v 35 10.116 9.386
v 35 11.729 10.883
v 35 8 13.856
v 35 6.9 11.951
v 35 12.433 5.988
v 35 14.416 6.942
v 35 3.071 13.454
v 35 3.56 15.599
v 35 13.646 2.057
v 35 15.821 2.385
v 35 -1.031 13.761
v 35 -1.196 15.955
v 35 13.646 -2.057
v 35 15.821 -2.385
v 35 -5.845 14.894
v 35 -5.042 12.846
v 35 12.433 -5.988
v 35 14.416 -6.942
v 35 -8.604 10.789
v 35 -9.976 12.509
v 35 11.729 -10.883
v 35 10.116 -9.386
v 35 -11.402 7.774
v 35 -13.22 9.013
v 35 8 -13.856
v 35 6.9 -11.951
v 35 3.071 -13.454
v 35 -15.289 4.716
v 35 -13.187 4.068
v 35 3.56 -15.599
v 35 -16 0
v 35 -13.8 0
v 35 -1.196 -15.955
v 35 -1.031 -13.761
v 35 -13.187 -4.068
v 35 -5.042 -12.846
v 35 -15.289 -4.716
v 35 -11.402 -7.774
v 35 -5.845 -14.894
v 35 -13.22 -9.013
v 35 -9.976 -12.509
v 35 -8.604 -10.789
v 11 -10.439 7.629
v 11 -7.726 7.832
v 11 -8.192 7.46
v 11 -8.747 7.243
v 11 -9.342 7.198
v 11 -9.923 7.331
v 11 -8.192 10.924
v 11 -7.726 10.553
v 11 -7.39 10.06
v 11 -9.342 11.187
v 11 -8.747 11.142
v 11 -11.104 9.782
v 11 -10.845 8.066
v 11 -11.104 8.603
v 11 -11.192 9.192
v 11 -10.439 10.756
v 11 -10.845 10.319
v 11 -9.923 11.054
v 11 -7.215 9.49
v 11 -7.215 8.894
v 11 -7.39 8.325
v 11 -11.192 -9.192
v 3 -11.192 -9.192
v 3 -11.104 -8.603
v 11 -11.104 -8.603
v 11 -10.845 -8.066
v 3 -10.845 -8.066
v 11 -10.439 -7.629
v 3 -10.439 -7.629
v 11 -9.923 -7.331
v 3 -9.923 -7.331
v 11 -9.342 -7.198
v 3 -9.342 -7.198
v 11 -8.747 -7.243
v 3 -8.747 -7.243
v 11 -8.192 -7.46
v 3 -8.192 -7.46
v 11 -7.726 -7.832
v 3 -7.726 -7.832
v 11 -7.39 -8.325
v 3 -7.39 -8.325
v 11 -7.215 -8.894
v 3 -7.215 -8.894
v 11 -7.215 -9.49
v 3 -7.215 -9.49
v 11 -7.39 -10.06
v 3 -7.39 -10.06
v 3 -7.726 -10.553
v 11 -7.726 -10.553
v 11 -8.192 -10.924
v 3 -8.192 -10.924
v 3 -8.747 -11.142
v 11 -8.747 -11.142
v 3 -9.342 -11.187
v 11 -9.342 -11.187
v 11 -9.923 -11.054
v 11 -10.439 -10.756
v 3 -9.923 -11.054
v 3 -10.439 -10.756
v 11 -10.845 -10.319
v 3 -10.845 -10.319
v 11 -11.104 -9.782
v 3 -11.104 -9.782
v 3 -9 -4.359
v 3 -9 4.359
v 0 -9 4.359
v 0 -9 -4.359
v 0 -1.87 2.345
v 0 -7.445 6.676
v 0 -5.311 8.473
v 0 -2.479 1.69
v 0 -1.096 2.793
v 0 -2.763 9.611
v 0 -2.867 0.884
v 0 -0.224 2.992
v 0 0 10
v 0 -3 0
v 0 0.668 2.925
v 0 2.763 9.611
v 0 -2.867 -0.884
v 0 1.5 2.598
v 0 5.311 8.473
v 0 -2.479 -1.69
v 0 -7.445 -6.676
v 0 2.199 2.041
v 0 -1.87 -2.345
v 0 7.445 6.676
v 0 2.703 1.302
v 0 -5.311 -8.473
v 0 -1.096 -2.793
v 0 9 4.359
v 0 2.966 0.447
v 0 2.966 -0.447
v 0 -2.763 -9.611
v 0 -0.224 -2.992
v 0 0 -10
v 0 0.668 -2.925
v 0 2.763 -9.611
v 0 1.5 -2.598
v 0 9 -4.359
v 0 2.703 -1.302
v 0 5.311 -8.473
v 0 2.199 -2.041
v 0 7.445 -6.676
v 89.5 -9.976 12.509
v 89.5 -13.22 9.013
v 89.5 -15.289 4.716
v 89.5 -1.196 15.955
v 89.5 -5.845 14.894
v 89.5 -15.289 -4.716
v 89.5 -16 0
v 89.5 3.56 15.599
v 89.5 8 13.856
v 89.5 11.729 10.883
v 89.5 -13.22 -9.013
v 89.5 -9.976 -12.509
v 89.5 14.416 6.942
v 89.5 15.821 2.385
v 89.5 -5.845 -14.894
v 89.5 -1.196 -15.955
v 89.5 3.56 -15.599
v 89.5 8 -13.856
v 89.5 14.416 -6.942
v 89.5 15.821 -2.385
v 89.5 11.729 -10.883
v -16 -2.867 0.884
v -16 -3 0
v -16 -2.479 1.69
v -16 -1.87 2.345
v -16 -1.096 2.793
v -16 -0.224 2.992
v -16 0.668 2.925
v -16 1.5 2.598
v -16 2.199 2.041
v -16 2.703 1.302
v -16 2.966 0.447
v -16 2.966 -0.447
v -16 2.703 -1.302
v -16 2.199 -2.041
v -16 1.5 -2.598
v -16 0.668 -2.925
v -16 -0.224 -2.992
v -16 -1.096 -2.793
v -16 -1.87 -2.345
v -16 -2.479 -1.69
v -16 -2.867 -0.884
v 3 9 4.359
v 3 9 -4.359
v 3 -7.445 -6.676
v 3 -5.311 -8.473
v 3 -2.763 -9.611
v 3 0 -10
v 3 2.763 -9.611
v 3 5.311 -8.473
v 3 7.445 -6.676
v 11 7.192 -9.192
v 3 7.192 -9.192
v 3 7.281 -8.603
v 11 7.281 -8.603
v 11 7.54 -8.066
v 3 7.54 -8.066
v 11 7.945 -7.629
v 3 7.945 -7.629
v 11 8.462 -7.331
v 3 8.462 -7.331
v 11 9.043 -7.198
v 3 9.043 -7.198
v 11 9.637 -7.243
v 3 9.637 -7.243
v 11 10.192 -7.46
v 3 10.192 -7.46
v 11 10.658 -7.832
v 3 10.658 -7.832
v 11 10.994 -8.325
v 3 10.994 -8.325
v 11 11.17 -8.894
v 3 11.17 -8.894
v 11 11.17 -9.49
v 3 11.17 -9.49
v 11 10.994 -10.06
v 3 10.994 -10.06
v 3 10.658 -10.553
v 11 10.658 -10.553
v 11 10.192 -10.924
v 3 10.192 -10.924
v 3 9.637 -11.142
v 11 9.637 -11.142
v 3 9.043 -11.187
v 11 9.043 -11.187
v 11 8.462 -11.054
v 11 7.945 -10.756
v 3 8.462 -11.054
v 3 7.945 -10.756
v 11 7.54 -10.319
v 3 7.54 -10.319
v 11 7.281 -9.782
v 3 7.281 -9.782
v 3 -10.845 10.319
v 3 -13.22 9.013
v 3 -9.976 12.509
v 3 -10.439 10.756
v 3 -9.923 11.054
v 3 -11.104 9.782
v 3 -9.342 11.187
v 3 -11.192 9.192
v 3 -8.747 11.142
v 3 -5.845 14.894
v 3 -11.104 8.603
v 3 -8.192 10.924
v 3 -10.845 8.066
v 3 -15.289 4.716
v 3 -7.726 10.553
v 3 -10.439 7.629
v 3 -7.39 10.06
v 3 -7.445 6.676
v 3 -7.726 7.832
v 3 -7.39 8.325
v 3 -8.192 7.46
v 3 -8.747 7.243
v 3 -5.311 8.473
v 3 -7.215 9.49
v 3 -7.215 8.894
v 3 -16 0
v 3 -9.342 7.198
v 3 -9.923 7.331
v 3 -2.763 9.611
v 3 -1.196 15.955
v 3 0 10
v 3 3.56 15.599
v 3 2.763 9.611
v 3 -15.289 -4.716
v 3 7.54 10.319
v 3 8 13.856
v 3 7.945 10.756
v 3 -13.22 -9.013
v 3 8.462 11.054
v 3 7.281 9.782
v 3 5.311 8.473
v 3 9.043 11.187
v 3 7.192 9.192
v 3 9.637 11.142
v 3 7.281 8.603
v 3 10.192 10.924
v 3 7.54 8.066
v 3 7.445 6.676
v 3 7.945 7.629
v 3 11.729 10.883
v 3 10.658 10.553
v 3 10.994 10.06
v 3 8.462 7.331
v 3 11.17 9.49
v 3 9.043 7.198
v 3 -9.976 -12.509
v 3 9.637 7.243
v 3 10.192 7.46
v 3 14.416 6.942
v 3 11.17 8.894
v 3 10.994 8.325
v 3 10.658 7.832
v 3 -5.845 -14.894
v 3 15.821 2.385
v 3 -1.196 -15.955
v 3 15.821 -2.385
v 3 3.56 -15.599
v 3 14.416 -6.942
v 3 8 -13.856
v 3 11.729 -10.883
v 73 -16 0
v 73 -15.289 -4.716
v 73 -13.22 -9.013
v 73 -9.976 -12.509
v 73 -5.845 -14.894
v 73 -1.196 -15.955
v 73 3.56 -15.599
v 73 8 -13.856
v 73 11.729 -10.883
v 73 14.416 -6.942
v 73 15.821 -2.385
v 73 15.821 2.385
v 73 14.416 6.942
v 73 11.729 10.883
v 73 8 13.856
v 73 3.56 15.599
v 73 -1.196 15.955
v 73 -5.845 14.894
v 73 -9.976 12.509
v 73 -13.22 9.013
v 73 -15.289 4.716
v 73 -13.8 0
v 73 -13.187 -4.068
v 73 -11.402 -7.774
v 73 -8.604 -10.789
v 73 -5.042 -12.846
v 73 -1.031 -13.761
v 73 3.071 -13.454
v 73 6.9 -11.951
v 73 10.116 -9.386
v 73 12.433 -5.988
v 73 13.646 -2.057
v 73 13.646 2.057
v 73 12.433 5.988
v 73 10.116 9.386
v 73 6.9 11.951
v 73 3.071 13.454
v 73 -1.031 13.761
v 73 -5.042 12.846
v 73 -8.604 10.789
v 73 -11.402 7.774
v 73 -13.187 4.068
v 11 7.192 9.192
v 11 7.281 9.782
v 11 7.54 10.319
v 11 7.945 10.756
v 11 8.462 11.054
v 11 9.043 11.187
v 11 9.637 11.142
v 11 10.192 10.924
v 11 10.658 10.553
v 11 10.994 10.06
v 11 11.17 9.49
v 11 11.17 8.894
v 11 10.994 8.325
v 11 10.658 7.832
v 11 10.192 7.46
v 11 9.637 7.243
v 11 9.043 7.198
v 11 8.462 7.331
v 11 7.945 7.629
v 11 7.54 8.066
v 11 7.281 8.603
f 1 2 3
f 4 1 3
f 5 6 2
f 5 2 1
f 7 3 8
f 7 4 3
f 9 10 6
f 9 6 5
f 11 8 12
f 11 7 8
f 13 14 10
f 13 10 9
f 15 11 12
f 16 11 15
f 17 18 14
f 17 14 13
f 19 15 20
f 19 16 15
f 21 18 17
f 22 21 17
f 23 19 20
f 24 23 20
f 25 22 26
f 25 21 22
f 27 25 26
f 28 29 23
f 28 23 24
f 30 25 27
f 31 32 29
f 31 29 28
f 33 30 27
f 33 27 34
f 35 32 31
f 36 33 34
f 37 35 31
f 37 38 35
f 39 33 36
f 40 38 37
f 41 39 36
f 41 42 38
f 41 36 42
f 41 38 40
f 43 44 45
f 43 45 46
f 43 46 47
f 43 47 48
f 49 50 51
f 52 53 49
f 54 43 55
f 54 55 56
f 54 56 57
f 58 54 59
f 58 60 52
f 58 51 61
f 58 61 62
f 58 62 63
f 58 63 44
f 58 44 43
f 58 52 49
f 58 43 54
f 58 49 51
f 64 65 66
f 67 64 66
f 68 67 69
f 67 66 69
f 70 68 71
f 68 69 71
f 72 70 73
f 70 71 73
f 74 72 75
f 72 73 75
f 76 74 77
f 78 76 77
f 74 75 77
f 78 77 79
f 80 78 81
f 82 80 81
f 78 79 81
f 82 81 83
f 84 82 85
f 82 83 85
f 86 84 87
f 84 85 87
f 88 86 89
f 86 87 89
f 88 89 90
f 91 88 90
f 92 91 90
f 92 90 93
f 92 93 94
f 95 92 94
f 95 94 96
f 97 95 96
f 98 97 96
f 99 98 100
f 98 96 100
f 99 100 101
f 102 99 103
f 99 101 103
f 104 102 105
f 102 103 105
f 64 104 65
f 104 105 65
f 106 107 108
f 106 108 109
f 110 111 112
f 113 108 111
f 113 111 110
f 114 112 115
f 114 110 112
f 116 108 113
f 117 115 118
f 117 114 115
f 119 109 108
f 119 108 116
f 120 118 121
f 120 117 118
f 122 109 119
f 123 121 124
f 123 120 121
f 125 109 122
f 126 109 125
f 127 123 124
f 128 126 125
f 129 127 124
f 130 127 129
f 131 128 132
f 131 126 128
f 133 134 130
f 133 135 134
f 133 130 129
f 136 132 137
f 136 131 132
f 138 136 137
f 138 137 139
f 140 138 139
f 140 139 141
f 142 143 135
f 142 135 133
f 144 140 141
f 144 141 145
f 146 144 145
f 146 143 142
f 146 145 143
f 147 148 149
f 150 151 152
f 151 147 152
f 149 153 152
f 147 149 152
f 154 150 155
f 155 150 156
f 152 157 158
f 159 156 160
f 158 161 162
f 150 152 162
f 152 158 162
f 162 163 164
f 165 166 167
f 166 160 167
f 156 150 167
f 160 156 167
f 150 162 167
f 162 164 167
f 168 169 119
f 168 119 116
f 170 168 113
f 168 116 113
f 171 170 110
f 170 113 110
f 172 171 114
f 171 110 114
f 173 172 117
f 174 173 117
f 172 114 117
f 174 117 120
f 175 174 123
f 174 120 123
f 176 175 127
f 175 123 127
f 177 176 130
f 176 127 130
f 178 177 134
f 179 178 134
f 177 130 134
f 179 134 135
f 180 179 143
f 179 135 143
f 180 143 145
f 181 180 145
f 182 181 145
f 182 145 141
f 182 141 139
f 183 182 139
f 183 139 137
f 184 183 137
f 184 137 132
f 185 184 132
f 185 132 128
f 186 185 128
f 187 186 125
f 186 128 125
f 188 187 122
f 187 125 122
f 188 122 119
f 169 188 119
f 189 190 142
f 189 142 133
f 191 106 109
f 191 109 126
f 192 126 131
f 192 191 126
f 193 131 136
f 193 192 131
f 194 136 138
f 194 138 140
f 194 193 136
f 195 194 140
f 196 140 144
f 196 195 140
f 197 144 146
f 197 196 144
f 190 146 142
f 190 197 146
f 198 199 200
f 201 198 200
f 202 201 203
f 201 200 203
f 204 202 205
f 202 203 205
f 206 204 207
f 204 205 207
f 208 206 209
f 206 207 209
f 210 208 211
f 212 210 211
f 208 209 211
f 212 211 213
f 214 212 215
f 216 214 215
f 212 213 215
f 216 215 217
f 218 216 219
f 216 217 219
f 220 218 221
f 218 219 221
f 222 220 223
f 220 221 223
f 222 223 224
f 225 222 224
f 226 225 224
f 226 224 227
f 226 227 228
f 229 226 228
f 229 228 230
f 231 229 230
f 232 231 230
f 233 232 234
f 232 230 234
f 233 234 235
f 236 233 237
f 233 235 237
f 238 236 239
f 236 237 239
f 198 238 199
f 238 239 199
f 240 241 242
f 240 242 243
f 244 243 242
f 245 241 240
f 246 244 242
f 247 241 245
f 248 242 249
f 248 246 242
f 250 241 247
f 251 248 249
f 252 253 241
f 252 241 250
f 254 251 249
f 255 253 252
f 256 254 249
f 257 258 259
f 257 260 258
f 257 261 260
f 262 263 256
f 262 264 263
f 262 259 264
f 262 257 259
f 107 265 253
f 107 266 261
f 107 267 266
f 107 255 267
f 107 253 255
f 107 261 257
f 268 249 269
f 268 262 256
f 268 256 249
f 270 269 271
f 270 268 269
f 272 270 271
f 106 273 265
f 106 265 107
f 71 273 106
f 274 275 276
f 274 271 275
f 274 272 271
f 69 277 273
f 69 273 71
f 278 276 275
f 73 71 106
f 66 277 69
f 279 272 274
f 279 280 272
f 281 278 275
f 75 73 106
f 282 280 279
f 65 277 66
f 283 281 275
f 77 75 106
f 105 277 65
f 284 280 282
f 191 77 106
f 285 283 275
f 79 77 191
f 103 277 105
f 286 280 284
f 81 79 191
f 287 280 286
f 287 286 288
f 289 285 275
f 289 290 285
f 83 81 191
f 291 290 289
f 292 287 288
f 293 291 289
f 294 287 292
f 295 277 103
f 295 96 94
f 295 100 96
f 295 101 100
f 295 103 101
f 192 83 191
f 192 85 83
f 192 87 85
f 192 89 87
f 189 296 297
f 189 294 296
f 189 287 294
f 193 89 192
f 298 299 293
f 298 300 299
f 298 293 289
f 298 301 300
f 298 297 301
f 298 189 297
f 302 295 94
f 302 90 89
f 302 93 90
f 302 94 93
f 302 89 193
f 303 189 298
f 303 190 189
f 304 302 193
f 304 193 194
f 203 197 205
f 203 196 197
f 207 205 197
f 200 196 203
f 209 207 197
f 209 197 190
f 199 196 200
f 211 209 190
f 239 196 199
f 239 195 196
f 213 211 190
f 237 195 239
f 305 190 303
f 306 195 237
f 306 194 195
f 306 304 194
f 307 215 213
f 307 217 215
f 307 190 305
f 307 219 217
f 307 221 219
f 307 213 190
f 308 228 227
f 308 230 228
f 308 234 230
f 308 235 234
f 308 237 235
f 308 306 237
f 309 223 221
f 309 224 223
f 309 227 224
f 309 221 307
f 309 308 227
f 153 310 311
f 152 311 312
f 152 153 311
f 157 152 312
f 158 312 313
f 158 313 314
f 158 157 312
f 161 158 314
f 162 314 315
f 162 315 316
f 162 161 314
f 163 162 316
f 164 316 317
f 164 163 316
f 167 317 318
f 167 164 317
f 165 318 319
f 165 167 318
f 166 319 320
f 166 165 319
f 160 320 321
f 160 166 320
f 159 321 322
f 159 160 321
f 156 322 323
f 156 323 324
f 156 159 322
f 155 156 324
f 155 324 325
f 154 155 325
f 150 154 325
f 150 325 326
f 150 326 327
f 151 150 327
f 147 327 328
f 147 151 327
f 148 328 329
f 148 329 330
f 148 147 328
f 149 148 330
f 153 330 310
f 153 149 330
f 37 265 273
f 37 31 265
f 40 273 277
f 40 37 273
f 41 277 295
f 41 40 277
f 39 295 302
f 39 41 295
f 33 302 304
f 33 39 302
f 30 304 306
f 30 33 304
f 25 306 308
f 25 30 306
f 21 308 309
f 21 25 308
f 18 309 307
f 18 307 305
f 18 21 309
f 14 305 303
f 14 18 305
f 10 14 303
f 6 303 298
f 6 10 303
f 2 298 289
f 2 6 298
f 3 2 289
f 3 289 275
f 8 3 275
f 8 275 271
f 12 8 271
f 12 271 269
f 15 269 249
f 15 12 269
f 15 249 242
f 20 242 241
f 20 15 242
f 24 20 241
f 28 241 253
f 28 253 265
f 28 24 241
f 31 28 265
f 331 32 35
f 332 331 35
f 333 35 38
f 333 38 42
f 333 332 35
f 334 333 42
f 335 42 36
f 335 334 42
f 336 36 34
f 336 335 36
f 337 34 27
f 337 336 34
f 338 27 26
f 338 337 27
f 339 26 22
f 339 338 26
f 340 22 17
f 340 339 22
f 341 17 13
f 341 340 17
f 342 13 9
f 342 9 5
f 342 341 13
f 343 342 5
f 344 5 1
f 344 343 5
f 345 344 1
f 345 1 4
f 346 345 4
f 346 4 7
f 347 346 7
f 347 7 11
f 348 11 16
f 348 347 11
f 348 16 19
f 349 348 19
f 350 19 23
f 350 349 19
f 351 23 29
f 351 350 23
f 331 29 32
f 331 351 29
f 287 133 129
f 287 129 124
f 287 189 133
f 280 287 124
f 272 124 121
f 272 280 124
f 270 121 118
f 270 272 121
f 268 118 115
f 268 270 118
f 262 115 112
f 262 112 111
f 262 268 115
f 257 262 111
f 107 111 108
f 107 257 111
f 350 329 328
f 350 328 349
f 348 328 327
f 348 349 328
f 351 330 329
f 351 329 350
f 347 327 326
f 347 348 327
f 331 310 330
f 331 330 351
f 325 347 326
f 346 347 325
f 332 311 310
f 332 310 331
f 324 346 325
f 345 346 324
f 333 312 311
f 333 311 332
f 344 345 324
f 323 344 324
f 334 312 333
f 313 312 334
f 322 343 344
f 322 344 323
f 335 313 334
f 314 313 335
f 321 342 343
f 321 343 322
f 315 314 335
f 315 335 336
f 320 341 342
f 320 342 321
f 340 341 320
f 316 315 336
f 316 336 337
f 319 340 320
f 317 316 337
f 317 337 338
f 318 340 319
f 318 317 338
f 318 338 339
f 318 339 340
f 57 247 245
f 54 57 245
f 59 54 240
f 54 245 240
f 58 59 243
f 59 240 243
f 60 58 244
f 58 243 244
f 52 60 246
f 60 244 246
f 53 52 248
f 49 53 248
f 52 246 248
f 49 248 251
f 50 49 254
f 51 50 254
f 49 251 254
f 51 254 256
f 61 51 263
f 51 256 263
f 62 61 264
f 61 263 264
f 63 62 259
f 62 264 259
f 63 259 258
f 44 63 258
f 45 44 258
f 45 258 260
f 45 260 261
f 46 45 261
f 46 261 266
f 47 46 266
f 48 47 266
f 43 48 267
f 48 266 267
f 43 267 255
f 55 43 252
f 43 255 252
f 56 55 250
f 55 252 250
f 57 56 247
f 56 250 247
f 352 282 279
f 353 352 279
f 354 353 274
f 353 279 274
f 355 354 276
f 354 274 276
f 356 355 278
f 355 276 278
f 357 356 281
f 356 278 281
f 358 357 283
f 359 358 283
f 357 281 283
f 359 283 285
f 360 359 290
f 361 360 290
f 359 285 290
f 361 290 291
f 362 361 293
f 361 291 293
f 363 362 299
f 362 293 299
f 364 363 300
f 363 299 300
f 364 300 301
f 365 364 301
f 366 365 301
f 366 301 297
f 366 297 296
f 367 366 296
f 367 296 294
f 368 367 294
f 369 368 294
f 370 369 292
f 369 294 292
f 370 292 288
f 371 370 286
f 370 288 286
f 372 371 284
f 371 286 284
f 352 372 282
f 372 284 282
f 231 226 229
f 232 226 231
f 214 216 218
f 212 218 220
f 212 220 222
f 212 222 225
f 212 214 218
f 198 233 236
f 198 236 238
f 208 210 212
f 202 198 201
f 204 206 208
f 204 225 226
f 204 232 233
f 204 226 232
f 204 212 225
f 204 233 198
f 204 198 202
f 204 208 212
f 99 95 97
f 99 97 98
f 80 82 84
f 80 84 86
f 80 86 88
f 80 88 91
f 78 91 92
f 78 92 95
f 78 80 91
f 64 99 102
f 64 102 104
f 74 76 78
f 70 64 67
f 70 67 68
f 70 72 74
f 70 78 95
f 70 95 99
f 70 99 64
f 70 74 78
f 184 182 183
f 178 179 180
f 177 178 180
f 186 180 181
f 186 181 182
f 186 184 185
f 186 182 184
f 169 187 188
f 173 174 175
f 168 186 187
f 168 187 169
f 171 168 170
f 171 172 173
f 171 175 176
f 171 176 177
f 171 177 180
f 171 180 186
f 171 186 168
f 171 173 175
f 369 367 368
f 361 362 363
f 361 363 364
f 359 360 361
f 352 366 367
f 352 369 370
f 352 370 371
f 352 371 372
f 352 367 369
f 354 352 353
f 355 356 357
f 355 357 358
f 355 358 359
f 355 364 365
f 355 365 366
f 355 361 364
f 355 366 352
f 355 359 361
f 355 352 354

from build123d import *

# Parameters (mm, degrees)
SKETCH2_W           = 16.5
SKETCH2_H           = 16
SKETCH4_R           = 2
CUT_EXTRUDE1_DEPTH  = 8
SKETCH5_R           = 3
BOSS_EXTRUDE1_DEPTH = 16
CUT_EXTRUDE2_START  = -3
CUT_EXTRUDE2_DEPTH  = 3


with BuildPart() as part:
    # Sketch1 → Revolve1 (revolve)
    with BuildSketch(Plane.XY, mode=Mode.PRIVATE) as revolve1_sk:
        Polygon((0, 0), (0, 10), (3, 10), (3, 16), (35, 16), (35, 13.8), (73, 13.8), (73, 0), align=None)
    revolve(revolve1_sk.sketch.rotate(Axis((0, 0, 0), (1, 0, 0)), 180), axis=Axis((0, 0, 0), (1, 0, 0)))

    # Sketch2 → Revolve2 (revolve)
    with BuildSketch(Plane.XY, mode=Mode.PRIVATE) as revolve2_sk:
        with Locations((81.25, 8)):
            Rectangle(SKETCH2_W, SKETCH2_H)
    revolve(revolve2_sk.sketch.rotate(Axis((73, 0, 0), (1, 0, 0)), 180), axis=Axis((73, 0, 0), (1, 0, 0)))

    # Sketch4 → Cut-Extrude1 (cut)
    with BuildSketch(Plane.ZY.offset(-3)):
        with Locations(Location((9.192388155, 9.192388155, 0), (0, 0, 270))):
            Circle(SKETCH4_R)
        with Locations(Location((9.192388155, -9.192388155, 0), (0, 0, 270))):
            Circle(SKETCH4_R)
        with Locations(Location((-9.192388155, -9.192388155, 0), (0, 0, 270))):
            Circle(SKETCH4_R)
        with Locations(Location((-9.192388155, 9.192388155, 0), (0, 0, 270))):
            Circle(SKETCH4_R)
    extrude(amount=-CUT_EXTRUDE1_DEPTH, mode=Mode.SUBTRACT)

    # Sketch5 → Boss-Extrude1 (add)
    with BuildSketch(Plane.ZY):
        with Locations(Location((0, 0, 0), (0, 0, 270))):
            Circle(SKETCH5_R)
    extrude(amount=BOSS_EXTRUDE1_DEPTH)

    # Sketch6 → Cut-Extrude2 (cut)
    with BuildSketch(Plane.ZY.offset(CUT_EXTRUDE2_START)):
        with BuildLine():
            Line((4.358898944, -9), (-4.358898944, -9))
            ThreePointArc((-4.358898944, -9), (0, -10), (4.358898944, -9))
        make_face()
        with BuildLine():
            ThreePointArc((4.358898944, 9), (0, 10), (-4.358898944, 9))
            Line((-4.358898944, 9), (4.358898944, 9))
        make_face()
    extrude(amount=CUT_EXTRUDE2_DEPTH, mode=Mode.SUBTRACT)


solid = part.part
